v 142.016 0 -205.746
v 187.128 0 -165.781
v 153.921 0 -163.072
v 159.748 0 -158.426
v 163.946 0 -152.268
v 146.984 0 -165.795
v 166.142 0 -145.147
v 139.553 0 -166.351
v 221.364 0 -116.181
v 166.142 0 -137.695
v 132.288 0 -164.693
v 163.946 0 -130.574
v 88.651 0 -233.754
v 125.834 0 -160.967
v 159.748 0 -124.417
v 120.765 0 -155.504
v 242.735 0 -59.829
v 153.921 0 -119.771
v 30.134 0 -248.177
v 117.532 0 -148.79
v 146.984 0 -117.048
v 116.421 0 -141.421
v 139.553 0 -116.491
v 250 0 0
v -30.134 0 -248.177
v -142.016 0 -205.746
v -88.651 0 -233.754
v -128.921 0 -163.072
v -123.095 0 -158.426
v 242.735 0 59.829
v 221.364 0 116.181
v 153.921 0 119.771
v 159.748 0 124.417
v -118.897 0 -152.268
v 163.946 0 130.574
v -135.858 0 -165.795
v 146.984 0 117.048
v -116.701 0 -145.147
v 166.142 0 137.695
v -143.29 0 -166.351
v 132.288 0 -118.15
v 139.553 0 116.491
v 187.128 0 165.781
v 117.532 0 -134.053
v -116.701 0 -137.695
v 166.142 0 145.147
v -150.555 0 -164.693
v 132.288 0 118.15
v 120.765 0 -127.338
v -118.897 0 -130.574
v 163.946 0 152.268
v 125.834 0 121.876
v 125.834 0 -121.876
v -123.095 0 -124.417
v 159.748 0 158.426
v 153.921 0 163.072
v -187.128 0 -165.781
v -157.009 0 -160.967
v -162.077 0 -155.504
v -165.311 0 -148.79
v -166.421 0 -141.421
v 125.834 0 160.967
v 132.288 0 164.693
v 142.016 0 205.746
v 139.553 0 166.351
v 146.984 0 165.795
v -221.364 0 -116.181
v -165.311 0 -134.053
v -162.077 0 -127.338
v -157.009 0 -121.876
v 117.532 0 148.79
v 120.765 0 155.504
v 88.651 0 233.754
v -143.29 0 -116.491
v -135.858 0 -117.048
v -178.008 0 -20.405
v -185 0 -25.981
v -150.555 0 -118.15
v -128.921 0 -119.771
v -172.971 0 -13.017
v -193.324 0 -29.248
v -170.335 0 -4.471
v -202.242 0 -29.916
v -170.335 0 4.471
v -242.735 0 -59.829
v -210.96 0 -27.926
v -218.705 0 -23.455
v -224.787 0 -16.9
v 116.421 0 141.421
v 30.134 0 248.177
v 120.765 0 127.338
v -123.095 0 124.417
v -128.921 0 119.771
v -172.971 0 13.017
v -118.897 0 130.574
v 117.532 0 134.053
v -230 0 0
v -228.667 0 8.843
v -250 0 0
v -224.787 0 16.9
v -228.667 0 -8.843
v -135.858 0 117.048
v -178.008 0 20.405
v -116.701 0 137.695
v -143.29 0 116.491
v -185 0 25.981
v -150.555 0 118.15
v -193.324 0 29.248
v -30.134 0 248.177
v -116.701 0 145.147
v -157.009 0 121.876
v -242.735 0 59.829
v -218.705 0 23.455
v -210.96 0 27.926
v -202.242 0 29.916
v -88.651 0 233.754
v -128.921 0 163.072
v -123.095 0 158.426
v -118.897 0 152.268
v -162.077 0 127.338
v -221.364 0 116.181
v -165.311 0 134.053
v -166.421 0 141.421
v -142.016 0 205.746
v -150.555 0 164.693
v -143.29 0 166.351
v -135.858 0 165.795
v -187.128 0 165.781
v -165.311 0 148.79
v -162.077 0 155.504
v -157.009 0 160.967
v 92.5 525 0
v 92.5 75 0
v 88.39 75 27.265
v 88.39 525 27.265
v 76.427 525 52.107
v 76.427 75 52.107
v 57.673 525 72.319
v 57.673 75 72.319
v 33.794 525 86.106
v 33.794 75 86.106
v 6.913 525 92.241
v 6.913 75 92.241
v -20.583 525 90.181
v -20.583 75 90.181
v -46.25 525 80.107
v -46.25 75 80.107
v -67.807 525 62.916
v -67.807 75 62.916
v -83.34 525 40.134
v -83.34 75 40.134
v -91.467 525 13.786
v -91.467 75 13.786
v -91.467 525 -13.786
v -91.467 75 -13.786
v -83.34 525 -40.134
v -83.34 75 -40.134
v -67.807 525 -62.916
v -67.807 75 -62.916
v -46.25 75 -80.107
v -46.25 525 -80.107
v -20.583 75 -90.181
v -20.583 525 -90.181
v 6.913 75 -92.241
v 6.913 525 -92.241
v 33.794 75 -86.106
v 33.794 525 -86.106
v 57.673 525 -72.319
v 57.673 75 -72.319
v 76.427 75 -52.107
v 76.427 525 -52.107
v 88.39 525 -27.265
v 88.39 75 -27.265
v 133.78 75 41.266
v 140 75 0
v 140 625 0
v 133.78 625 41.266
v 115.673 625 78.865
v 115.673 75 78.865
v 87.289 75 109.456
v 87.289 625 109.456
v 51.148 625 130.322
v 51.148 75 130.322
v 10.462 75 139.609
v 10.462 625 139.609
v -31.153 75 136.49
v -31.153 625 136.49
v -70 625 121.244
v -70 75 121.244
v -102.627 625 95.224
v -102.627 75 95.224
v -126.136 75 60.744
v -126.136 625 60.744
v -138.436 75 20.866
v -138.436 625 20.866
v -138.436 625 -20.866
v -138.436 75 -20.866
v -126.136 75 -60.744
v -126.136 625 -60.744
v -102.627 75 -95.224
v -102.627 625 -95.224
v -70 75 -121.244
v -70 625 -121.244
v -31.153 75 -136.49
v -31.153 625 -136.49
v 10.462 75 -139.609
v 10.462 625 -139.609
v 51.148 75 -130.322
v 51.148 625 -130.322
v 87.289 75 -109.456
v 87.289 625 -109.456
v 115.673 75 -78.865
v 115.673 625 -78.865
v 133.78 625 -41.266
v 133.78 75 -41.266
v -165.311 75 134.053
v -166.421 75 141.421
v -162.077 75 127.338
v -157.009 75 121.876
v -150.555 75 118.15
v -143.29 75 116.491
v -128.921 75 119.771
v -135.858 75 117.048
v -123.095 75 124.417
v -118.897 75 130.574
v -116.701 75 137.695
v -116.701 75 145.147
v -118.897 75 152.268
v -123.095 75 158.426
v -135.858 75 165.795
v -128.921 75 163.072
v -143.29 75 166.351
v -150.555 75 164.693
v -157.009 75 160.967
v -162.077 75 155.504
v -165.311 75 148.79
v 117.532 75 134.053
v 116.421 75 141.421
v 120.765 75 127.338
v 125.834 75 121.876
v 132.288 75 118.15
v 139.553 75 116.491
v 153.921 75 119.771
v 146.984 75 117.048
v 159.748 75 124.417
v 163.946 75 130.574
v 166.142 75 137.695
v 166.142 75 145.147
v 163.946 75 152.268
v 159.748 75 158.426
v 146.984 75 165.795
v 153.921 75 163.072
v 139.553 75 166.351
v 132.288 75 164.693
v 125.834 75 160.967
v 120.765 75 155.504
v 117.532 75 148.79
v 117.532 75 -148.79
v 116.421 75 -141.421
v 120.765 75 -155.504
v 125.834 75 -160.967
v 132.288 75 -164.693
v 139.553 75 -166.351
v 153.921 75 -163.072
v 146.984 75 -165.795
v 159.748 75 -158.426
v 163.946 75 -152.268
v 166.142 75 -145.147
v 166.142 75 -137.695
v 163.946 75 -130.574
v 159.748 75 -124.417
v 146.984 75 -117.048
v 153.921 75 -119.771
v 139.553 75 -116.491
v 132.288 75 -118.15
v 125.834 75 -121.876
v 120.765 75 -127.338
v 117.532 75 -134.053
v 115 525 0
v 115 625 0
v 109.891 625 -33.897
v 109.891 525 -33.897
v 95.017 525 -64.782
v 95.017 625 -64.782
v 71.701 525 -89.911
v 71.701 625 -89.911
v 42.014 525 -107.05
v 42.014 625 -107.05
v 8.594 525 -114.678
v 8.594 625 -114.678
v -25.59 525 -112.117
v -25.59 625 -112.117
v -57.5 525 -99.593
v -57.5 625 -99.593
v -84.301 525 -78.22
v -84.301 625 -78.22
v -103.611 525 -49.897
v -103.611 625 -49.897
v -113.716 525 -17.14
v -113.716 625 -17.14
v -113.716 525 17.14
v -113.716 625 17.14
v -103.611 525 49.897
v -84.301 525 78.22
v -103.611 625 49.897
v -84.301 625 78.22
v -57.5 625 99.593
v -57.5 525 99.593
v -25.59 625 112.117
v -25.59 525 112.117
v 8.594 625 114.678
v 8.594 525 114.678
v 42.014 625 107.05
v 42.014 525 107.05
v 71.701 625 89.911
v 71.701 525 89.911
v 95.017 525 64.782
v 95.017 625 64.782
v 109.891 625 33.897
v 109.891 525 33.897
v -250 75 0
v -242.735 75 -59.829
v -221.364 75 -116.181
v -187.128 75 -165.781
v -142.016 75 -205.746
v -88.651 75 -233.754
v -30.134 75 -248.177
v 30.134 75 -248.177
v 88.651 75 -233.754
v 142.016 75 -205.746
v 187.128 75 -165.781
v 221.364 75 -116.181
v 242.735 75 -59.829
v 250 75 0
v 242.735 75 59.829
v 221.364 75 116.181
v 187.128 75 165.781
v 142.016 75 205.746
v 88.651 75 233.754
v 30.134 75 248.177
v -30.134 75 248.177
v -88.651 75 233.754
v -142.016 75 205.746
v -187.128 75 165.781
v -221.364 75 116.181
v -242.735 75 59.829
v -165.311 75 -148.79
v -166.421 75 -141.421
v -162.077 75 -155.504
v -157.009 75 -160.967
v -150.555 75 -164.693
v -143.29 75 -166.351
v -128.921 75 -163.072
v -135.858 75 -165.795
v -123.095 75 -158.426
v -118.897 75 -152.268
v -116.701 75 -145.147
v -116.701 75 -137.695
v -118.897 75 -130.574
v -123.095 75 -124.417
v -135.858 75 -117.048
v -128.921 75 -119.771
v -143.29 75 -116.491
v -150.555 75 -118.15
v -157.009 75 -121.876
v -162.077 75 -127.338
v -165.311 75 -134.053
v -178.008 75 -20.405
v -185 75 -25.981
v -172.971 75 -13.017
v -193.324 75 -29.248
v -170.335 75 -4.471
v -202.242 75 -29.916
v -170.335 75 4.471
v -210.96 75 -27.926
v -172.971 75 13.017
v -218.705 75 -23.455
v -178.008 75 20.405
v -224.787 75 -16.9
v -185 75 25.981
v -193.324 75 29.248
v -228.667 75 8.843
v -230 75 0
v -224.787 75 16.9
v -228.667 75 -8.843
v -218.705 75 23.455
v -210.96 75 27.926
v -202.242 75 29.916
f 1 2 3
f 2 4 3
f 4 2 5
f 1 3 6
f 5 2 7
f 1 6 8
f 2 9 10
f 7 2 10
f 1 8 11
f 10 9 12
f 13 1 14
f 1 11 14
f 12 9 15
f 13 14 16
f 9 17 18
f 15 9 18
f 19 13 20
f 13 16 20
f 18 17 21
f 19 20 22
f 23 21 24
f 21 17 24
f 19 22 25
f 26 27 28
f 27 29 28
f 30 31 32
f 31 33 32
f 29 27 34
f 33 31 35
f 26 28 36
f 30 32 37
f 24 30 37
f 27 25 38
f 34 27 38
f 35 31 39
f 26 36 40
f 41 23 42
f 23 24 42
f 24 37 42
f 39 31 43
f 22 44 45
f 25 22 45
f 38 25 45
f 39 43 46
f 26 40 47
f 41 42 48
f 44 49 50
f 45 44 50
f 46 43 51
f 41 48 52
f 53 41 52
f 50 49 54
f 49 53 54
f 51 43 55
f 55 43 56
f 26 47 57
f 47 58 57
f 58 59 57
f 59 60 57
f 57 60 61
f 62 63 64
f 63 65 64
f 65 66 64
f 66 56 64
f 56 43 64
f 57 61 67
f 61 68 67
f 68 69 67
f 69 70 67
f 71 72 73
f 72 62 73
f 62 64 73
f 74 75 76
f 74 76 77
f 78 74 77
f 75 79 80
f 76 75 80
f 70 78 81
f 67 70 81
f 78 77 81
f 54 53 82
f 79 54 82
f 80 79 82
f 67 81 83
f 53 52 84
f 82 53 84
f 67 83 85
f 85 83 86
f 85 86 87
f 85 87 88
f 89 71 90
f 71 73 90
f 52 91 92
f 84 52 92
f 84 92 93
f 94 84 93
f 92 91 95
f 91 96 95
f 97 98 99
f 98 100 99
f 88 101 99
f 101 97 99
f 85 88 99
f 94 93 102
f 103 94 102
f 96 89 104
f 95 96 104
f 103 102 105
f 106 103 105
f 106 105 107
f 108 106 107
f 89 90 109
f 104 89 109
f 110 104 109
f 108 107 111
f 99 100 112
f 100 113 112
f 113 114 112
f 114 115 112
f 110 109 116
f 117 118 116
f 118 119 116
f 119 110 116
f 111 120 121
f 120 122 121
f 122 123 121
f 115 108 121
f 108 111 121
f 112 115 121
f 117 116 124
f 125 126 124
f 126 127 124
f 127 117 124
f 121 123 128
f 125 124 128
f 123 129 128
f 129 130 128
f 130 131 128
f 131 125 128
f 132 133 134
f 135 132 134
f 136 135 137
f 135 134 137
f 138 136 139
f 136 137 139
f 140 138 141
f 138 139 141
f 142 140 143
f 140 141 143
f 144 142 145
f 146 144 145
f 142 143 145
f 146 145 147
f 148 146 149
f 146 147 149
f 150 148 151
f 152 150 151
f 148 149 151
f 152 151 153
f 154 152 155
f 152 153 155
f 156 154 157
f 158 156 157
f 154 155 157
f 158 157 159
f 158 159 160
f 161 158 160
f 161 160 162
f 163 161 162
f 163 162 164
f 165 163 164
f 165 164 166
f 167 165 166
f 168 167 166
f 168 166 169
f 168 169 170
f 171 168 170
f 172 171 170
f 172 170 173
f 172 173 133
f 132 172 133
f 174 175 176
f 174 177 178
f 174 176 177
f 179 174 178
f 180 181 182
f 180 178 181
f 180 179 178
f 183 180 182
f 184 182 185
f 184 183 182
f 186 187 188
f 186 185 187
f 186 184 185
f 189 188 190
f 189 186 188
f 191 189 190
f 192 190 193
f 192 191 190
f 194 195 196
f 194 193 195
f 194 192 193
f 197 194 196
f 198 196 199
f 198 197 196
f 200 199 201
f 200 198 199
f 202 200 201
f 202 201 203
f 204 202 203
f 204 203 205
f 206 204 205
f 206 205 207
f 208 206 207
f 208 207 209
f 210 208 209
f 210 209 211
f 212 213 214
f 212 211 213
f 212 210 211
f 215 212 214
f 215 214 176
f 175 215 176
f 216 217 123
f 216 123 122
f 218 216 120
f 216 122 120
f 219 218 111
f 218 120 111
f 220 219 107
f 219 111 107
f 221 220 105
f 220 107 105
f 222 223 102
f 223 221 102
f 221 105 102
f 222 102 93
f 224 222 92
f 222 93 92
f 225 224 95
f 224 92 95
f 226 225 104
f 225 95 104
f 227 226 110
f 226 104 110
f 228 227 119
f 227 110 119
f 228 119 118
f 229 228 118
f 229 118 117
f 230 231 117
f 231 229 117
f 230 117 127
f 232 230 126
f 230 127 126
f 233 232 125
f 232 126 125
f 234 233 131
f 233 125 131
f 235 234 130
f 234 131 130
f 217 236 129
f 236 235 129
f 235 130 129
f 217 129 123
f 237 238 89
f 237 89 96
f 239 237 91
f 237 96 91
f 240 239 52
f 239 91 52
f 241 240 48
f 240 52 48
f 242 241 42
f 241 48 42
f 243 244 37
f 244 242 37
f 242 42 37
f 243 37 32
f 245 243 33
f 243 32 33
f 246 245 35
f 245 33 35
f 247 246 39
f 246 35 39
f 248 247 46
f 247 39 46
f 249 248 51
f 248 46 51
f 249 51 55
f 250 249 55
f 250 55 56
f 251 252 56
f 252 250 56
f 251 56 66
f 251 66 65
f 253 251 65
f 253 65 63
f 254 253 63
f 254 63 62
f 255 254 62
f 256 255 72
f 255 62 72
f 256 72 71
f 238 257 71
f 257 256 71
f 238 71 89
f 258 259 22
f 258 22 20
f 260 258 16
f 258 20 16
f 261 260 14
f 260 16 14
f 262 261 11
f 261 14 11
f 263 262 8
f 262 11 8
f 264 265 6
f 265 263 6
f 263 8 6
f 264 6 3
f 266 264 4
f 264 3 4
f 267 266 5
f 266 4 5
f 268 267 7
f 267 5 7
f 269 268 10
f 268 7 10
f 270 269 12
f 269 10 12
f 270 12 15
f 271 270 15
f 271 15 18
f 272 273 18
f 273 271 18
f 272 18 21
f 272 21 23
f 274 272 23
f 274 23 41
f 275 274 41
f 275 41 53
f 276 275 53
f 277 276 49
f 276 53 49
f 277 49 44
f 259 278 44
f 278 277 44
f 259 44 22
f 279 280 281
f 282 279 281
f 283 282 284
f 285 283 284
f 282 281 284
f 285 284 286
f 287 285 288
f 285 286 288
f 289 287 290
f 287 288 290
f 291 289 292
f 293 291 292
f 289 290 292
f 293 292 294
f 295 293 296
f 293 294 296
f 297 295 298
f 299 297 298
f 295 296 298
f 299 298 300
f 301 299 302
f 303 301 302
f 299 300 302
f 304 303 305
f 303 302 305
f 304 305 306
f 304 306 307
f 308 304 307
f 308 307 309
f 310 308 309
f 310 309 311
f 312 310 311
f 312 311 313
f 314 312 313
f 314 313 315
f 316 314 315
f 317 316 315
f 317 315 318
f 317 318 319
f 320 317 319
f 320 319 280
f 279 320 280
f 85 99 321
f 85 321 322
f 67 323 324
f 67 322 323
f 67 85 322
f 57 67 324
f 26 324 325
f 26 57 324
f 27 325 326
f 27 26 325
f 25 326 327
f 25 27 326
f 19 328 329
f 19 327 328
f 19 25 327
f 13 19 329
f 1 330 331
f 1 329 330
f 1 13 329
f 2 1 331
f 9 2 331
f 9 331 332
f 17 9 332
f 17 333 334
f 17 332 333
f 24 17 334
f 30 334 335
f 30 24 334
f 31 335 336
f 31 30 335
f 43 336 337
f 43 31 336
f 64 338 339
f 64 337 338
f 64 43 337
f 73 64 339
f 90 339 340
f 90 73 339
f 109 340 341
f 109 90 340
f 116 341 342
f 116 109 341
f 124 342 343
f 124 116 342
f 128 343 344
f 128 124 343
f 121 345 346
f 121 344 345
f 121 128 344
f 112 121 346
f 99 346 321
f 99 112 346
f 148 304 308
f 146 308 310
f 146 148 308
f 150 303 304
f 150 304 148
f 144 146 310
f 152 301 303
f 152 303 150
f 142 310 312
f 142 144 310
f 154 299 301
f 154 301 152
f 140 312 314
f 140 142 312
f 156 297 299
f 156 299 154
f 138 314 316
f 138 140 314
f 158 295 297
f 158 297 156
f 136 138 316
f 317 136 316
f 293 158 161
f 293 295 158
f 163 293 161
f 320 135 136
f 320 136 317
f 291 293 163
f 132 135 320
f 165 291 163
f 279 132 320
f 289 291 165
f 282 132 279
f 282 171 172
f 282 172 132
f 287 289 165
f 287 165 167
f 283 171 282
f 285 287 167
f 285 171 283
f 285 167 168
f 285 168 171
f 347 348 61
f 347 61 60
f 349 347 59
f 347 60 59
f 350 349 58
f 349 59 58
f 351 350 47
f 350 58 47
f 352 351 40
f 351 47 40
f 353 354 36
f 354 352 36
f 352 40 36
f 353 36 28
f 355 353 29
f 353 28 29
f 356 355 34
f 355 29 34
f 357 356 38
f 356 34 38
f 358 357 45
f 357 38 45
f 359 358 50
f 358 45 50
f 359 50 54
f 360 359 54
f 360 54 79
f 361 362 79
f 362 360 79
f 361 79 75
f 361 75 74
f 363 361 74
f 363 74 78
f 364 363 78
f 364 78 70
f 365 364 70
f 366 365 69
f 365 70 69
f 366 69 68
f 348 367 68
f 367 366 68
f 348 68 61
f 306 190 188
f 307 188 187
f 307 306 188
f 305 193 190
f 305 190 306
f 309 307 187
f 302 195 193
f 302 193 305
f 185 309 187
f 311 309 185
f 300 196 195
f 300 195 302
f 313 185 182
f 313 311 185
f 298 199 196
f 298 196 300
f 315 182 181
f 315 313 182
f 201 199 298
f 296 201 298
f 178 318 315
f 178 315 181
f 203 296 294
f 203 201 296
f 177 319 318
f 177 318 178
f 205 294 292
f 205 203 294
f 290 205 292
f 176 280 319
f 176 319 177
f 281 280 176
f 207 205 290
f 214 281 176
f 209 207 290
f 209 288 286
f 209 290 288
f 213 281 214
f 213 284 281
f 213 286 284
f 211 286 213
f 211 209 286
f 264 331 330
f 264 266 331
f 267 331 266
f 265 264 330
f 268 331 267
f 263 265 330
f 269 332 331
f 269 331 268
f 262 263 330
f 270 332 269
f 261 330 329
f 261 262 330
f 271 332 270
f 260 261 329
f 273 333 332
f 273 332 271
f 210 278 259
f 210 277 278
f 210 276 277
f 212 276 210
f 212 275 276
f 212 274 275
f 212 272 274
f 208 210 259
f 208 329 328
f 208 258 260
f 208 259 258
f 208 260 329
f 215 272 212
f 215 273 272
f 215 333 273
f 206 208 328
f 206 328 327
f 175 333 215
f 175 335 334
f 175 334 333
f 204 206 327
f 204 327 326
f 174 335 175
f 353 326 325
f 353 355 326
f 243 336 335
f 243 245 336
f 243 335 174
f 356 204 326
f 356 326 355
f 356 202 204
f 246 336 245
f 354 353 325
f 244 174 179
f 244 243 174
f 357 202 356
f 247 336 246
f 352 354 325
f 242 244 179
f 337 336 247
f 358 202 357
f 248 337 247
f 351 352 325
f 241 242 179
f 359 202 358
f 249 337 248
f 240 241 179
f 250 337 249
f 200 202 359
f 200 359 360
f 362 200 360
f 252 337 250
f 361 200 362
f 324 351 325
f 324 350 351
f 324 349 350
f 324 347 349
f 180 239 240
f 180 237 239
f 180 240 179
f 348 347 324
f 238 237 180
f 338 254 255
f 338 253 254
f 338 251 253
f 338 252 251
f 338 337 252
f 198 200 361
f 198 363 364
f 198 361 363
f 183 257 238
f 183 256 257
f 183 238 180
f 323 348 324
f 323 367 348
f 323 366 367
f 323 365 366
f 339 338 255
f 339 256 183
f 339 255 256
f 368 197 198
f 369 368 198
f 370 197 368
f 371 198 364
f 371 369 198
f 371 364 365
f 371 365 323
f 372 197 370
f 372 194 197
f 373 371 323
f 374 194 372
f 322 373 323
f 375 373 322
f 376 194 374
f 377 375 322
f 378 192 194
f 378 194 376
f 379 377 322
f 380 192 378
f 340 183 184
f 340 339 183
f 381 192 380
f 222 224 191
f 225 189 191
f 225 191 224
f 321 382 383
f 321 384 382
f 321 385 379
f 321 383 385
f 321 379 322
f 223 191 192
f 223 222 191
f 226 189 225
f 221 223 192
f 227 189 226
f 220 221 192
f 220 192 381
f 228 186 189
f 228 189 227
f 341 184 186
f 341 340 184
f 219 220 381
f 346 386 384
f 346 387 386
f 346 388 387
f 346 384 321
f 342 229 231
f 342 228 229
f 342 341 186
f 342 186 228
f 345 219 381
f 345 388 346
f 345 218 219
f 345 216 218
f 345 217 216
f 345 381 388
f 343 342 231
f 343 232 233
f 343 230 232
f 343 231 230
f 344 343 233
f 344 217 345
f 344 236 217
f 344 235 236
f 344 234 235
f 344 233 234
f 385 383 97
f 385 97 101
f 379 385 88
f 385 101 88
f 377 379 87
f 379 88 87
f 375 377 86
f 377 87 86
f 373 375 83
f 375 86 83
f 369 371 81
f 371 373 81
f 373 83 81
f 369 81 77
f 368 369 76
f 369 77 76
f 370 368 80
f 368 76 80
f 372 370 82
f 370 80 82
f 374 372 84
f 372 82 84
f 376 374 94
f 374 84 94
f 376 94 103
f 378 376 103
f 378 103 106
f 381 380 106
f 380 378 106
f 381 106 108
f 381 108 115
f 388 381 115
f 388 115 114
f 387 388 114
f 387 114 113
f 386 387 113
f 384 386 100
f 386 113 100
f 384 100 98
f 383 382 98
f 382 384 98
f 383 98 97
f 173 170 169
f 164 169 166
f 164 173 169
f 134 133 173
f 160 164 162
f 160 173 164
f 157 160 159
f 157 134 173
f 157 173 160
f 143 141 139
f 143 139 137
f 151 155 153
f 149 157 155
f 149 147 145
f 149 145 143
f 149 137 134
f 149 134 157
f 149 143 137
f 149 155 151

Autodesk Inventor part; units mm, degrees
ref_plane "YZ Plane" through (0, 0, 0) normal (1, 0, 0) x (0, 1, 0)
ref_plane "XZ Plane" through (0, 0, 0) normal (0, 1, 0) x (-1, 0, 0)
ref_plane "XY Plane" through (0, 0, 0) normal (0, 0, 1) x (1, 0, 0)
sketch "Sketch1" plane through (0, 0, 0) normal (0, 1, 0) x (-1, 0, 0)
  circle A0 centre (0, 0) radius 250
  circle A1 centre (0, 0) radius 200 construction
  line L0 (0, 0) -> (0, -250) construction
  line L1 (0, 0) -> (176.7767, 176.7767) construction
  line L2 (0, 0) -> (250, 0) construction
  line L3 (176.7767, 176.7767) -> (-176.7767, -176.7767) construction
  line L4 (176.7767, -176.7767) -> (-176.7767, 176.7767) construction
  circle A2 centre (141.4214, 141.4214) radius 25
  circle A3 centre (-141.4214, 141.4214) radius 25
  circle A4 centre (-141.4214, -141.4214) radius 25
  circle A5 centre (141.4214, -141.4214) radius 25
  circle A6 centre (200, 0) radius 30
  dimension "d0" = 500
  dimension "d1" = 400
  dimension "d2" = 45
  dimension "d3" = 50
  dimension "d4" = 50
  dimension "d5" = 50
  dimension "d6" = 50
  dimension "d7" = 60
extrude "Extrusion1" add sketch "Sketch1" along normal blind 75
sketch "Sketch2" plane through (0, 75, 0) normal (0, 1, 0) x (1, 0, 0)
  circle A0 centre (0, 0) radius 140
  circle A1 centre (0, 0) radius 92.5
  dimension "d10" = 280
  dimension "d11" = 185
extrude "Extrusion2" add sketch "Sketch2" along normal blind 550
sketch "Sketch4" plane through (0, 625, 0) normal (0, 1, 0) x (1, 0, 0)
  circle A0 centre (0, 0) radius 115
  dimension "d22" = 230
extrude "Extrusion4" cut sketch "Sketch4" against normal blind 100
properties part number "base marcador"
